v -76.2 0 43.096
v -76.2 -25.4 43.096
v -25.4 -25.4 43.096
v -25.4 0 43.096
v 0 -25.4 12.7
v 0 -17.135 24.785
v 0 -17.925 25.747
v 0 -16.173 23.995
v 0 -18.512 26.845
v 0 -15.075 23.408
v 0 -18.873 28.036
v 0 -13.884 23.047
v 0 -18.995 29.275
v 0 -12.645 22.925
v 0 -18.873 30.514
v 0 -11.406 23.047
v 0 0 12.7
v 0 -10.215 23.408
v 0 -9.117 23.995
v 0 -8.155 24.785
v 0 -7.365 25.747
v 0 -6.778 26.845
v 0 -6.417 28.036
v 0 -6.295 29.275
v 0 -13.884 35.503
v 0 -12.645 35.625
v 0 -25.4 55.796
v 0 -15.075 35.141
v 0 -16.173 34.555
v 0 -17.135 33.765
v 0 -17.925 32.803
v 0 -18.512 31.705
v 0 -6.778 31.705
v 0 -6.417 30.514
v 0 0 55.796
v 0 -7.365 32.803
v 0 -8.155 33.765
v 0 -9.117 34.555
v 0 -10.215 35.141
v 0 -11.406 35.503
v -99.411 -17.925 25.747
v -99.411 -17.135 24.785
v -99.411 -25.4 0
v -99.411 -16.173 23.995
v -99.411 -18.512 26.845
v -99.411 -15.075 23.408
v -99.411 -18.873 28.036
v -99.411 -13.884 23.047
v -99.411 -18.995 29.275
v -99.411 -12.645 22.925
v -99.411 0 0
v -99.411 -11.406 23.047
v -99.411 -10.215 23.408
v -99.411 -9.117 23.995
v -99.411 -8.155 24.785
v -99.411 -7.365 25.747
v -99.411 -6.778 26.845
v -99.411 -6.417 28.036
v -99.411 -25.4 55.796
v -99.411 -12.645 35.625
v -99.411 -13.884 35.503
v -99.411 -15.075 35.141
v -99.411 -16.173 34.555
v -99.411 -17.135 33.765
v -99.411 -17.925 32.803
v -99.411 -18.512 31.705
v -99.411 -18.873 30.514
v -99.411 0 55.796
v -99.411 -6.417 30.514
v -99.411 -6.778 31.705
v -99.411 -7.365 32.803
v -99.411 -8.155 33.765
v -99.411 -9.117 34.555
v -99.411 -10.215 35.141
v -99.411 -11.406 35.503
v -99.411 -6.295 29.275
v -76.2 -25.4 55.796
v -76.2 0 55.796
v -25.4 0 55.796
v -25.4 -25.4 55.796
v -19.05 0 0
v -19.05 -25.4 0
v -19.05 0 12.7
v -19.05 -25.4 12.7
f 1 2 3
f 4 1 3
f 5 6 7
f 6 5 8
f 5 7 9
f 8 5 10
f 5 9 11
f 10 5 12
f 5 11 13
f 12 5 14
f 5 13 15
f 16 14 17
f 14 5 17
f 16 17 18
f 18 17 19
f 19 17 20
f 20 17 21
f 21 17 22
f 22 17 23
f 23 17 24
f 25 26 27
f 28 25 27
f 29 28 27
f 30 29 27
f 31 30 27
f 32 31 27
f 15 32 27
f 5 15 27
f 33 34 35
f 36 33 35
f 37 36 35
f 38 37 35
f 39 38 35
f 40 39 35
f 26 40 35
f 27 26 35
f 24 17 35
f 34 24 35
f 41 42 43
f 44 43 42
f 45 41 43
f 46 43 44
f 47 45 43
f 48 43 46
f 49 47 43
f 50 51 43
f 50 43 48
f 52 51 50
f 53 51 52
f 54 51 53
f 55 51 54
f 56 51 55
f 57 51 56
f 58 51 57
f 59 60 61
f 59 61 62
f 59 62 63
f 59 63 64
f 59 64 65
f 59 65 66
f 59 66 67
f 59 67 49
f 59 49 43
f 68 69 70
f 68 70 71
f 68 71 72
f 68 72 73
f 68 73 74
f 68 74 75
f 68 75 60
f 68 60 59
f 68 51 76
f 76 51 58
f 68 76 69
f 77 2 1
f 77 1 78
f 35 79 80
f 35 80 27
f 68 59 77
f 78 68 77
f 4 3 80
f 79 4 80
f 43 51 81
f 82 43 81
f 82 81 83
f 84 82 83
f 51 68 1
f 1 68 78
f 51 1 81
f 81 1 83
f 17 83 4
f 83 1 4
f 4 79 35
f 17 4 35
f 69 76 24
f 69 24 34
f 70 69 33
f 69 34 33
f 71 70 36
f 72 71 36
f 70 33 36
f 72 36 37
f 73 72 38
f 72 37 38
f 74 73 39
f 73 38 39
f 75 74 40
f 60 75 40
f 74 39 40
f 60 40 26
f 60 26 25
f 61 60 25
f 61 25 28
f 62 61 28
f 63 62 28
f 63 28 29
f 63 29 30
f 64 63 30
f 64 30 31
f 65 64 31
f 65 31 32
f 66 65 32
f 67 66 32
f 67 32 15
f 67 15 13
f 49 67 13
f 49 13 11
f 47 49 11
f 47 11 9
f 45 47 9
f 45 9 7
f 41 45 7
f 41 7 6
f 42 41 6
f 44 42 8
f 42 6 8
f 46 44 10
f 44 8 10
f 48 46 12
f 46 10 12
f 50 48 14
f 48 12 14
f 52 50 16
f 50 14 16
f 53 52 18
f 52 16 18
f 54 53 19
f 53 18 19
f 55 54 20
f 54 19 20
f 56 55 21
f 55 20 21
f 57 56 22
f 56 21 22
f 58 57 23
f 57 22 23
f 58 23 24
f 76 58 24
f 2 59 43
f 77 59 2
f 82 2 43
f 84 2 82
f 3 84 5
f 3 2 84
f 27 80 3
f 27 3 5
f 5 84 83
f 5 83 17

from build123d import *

# Parameters (mm, degrees)
F0_W     = 99.410921
F0_H     = 55.796448
F1_DEPTH = 25.4
F2_W     = 50.8
F2_H     = 12.7
F3_DEPTH = 25.4
F4_W     = 19.05
F4_H     = 12.7
F5_DEPTH = 25.4
F7_R     = 6.35
F8_DEPTH = 101.6


with BuildPart() as f1:
    # F0 (on Front) → F1 (new body)
    with BuildSketch(Plane.XZ):
        with Locations((-49.705461, 27.898224)):
            Rectangle(F0_W, F0_H)
    extrude(amount=F1_DEPTH)

    # F2 (on face) → F3 (cut)
    with BuildSketch(Plane.XZ.offset(25.4)):
        with Locations((-50.8, 49.446448)):
            Rectangle(F2_W, F2_H)
    extrude(amount=-F3_DEPTH, mode=Mode.SUBTRACT)

    # F4 (on face) → F5 (cut)
    with BuildSketch(Plane.XZ.offset(25.4)):
        with Locations((-9.525, 6.35)):
            Rectangle(F4_W, F4_H)
    extrude(amount=-F5_DEPTH, mode=Mode.SUBTRACT)

    # F7 (on face) → F8 (cut)
    with BuildSketch(Plane.YZ):
        with Locations((-12.644938, 29.27478)):
            Circle(F7_R)
    extrude(amount=-F8_DEPTH, mode=Mode.SUBTRACT)


solid = f1.part
